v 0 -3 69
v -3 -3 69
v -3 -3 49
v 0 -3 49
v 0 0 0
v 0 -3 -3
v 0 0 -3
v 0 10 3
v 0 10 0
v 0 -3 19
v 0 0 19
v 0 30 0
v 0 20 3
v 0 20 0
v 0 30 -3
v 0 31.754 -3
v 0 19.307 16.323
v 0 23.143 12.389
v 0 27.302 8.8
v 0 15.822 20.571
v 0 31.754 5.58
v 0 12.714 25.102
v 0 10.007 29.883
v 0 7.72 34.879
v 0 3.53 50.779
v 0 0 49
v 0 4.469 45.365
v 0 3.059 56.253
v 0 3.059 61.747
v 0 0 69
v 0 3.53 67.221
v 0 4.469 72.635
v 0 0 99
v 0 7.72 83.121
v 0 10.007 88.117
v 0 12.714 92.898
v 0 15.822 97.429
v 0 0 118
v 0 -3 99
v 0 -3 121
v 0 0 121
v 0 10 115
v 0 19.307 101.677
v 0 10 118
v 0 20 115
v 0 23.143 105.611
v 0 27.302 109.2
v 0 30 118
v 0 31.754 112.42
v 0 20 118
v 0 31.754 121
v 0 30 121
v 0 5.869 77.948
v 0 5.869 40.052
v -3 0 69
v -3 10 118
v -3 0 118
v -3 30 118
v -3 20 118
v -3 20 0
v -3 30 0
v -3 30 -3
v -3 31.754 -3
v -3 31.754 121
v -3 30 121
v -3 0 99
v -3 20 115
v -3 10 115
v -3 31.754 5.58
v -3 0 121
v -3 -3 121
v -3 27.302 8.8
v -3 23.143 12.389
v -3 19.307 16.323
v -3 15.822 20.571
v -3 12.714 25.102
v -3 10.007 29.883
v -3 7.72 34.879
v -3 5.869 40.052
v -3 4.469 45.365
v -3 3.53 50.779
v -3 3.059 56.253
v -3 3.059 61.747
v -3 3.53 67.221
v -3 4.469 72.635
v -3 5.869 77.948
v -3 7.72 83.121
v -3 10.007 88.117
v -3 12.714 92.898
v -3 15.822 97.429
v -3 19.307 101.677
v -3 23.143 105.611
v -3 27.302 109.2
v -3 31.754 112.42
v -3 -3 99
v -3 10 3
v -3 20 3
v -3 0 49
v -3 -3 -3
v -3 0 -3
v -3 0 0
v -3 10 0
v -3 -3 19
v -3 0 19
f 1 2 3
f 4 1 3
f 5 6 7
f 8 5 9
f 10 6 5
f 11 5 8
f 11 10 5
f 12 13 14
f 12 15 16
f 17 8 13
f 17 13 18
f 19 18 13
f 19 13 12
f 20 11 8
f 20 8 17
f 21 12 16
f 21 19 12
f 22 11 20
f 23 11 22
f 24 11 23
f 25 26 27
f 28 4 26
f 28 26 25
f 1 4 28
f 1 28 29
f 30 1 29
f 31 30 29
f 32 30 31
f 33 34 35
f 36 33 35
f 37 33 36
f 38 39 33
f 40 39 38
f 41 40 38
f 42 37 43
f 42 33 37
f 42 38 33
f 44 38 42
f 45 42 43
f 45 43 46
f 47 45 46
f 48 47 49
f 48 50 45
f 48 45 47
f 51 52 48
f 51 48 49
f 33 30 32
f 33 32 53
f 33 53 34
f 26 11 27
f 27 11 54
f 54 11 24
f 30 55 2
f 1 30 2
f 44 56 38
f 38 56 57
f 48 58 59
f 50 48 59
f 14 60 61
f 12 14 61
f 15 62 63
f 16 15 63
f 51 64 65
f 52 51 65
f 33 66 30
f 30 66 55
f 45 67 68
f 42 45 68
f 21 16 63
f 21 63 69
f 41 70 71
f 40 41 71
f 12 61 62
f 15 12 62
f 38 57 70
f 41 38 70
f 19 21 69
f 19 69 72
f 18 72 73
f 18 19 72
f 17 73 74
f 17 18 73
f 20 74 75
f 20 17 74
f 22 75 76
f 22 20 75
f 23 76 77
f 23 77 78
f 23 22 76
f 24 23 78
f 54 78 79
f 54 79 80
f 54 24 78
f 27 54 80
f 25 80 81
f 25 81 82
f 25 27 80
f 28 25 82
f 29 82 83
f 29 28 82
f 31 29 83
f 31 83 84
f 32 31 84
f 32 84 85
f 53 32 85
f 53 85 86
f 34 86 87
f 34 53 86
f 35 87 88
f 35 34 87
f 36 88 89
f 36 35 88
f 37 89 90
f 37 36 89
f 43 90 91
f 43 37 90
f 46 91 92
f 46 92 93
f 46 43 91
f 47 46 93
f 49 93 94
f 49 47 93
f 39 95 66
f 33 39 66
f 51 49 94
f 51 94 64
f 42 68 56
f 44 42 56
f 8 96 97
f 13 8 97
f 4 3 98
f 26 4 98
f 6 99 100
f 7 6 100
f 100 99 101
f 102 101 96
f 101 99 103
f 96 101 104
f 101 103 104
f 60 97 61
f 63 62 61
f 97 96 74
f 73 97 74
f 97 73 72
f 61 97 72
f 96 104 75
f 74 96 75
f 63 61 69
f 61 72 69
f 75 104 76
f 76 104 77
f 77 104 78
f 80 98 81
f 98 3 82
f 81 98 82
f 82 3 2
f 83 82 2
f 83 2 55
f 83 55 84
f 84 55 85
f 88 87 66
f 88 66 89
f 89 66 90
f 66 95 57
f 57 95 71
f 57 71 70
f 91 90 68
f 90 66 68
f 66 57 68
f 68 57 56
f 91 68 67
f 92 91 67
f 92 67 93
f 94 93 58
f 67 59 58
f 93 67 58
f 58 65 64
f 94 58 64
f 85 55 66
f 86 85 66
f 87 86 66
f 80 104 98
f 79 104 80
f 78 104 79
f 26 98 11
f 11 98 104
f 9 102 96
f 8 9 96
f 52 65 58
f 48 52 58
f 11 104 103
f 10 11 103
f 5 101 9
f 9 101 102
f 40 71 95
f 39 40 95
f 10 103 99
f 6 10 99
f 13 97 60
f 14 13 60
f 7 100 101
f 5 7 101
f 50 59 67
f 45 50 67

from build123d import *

# Parameters (mm, degrees)
IMPORTED_START          = -3
IMPORTED_BODY_4_1_DEPTH = 3
CUT_EXTRUDE_2_DEPTH     = 3


# Read off the part's stored shape, not the designer's step: 基体零件-零件4-1
with BuildPart() as part:
    # 基体零件-零件4-1 outline → 基体零件-零件4-1 (new body)
    with BuildSketch(Plane.YZ.offset(IMPORTED_START)):
        Polygon((-3, -3), (0, -3), (0, 0), (9.999598957, 0), (9.999598957, 3), (20.000401043, 3), (20.000401043, 0), (30, 0), (30, -3), (52, -3), (52, 0), (82, 0), (82, -3), (104, -3), (104, 19), (101, 19), (101, 49), (104, 49), (104, 69), (101, 69), (101, 99), (104, 99), (104, 121), (82, 121), (82, 118), (52, 118), (52, 121), (30, 121), (30, 118), (20.000401043, 118), (20.000401043, 115), (9.999598957, 115), (9.999598957, 118), (0, 118), (0, 121), (-3, 121), (-3, 99), (0, 99), (0, 69), (-3, 69), (-3, 49), (0, 49), (0, 19), (-3, 19), align=None)
    extrude(amount=IMPORTED_BODY_4_1_DEPTH)

    # 草图3 → 切除-拉伸2 (cut)
    with BuildSketch(Plane(origin=(0, 0, 0), x_dir=(0, 0, -1), z_dir=(1, 0, 0))):
        with BuildLine():
            Line((-121, 104), (3, 104))
            Line((3, 104), (3, 31.75415679))
            Line((3, 31.75415679), (-5.579680491, 31.75415679))
            ThreePointArc((-5.579680491, 31.75415679), (-59, 3), (-112.420319509, 31.75415679))
            Line((-112.420319509, 31.75415679), (-121, 31.75415679))
            Line((-121, 31.75415679), (-121, 104))
        make_face()
    extrude(amount=-CUT_EXTRUDE_2_DEPTH, mode=Mode.SUBTRACT)


solid = part.part
